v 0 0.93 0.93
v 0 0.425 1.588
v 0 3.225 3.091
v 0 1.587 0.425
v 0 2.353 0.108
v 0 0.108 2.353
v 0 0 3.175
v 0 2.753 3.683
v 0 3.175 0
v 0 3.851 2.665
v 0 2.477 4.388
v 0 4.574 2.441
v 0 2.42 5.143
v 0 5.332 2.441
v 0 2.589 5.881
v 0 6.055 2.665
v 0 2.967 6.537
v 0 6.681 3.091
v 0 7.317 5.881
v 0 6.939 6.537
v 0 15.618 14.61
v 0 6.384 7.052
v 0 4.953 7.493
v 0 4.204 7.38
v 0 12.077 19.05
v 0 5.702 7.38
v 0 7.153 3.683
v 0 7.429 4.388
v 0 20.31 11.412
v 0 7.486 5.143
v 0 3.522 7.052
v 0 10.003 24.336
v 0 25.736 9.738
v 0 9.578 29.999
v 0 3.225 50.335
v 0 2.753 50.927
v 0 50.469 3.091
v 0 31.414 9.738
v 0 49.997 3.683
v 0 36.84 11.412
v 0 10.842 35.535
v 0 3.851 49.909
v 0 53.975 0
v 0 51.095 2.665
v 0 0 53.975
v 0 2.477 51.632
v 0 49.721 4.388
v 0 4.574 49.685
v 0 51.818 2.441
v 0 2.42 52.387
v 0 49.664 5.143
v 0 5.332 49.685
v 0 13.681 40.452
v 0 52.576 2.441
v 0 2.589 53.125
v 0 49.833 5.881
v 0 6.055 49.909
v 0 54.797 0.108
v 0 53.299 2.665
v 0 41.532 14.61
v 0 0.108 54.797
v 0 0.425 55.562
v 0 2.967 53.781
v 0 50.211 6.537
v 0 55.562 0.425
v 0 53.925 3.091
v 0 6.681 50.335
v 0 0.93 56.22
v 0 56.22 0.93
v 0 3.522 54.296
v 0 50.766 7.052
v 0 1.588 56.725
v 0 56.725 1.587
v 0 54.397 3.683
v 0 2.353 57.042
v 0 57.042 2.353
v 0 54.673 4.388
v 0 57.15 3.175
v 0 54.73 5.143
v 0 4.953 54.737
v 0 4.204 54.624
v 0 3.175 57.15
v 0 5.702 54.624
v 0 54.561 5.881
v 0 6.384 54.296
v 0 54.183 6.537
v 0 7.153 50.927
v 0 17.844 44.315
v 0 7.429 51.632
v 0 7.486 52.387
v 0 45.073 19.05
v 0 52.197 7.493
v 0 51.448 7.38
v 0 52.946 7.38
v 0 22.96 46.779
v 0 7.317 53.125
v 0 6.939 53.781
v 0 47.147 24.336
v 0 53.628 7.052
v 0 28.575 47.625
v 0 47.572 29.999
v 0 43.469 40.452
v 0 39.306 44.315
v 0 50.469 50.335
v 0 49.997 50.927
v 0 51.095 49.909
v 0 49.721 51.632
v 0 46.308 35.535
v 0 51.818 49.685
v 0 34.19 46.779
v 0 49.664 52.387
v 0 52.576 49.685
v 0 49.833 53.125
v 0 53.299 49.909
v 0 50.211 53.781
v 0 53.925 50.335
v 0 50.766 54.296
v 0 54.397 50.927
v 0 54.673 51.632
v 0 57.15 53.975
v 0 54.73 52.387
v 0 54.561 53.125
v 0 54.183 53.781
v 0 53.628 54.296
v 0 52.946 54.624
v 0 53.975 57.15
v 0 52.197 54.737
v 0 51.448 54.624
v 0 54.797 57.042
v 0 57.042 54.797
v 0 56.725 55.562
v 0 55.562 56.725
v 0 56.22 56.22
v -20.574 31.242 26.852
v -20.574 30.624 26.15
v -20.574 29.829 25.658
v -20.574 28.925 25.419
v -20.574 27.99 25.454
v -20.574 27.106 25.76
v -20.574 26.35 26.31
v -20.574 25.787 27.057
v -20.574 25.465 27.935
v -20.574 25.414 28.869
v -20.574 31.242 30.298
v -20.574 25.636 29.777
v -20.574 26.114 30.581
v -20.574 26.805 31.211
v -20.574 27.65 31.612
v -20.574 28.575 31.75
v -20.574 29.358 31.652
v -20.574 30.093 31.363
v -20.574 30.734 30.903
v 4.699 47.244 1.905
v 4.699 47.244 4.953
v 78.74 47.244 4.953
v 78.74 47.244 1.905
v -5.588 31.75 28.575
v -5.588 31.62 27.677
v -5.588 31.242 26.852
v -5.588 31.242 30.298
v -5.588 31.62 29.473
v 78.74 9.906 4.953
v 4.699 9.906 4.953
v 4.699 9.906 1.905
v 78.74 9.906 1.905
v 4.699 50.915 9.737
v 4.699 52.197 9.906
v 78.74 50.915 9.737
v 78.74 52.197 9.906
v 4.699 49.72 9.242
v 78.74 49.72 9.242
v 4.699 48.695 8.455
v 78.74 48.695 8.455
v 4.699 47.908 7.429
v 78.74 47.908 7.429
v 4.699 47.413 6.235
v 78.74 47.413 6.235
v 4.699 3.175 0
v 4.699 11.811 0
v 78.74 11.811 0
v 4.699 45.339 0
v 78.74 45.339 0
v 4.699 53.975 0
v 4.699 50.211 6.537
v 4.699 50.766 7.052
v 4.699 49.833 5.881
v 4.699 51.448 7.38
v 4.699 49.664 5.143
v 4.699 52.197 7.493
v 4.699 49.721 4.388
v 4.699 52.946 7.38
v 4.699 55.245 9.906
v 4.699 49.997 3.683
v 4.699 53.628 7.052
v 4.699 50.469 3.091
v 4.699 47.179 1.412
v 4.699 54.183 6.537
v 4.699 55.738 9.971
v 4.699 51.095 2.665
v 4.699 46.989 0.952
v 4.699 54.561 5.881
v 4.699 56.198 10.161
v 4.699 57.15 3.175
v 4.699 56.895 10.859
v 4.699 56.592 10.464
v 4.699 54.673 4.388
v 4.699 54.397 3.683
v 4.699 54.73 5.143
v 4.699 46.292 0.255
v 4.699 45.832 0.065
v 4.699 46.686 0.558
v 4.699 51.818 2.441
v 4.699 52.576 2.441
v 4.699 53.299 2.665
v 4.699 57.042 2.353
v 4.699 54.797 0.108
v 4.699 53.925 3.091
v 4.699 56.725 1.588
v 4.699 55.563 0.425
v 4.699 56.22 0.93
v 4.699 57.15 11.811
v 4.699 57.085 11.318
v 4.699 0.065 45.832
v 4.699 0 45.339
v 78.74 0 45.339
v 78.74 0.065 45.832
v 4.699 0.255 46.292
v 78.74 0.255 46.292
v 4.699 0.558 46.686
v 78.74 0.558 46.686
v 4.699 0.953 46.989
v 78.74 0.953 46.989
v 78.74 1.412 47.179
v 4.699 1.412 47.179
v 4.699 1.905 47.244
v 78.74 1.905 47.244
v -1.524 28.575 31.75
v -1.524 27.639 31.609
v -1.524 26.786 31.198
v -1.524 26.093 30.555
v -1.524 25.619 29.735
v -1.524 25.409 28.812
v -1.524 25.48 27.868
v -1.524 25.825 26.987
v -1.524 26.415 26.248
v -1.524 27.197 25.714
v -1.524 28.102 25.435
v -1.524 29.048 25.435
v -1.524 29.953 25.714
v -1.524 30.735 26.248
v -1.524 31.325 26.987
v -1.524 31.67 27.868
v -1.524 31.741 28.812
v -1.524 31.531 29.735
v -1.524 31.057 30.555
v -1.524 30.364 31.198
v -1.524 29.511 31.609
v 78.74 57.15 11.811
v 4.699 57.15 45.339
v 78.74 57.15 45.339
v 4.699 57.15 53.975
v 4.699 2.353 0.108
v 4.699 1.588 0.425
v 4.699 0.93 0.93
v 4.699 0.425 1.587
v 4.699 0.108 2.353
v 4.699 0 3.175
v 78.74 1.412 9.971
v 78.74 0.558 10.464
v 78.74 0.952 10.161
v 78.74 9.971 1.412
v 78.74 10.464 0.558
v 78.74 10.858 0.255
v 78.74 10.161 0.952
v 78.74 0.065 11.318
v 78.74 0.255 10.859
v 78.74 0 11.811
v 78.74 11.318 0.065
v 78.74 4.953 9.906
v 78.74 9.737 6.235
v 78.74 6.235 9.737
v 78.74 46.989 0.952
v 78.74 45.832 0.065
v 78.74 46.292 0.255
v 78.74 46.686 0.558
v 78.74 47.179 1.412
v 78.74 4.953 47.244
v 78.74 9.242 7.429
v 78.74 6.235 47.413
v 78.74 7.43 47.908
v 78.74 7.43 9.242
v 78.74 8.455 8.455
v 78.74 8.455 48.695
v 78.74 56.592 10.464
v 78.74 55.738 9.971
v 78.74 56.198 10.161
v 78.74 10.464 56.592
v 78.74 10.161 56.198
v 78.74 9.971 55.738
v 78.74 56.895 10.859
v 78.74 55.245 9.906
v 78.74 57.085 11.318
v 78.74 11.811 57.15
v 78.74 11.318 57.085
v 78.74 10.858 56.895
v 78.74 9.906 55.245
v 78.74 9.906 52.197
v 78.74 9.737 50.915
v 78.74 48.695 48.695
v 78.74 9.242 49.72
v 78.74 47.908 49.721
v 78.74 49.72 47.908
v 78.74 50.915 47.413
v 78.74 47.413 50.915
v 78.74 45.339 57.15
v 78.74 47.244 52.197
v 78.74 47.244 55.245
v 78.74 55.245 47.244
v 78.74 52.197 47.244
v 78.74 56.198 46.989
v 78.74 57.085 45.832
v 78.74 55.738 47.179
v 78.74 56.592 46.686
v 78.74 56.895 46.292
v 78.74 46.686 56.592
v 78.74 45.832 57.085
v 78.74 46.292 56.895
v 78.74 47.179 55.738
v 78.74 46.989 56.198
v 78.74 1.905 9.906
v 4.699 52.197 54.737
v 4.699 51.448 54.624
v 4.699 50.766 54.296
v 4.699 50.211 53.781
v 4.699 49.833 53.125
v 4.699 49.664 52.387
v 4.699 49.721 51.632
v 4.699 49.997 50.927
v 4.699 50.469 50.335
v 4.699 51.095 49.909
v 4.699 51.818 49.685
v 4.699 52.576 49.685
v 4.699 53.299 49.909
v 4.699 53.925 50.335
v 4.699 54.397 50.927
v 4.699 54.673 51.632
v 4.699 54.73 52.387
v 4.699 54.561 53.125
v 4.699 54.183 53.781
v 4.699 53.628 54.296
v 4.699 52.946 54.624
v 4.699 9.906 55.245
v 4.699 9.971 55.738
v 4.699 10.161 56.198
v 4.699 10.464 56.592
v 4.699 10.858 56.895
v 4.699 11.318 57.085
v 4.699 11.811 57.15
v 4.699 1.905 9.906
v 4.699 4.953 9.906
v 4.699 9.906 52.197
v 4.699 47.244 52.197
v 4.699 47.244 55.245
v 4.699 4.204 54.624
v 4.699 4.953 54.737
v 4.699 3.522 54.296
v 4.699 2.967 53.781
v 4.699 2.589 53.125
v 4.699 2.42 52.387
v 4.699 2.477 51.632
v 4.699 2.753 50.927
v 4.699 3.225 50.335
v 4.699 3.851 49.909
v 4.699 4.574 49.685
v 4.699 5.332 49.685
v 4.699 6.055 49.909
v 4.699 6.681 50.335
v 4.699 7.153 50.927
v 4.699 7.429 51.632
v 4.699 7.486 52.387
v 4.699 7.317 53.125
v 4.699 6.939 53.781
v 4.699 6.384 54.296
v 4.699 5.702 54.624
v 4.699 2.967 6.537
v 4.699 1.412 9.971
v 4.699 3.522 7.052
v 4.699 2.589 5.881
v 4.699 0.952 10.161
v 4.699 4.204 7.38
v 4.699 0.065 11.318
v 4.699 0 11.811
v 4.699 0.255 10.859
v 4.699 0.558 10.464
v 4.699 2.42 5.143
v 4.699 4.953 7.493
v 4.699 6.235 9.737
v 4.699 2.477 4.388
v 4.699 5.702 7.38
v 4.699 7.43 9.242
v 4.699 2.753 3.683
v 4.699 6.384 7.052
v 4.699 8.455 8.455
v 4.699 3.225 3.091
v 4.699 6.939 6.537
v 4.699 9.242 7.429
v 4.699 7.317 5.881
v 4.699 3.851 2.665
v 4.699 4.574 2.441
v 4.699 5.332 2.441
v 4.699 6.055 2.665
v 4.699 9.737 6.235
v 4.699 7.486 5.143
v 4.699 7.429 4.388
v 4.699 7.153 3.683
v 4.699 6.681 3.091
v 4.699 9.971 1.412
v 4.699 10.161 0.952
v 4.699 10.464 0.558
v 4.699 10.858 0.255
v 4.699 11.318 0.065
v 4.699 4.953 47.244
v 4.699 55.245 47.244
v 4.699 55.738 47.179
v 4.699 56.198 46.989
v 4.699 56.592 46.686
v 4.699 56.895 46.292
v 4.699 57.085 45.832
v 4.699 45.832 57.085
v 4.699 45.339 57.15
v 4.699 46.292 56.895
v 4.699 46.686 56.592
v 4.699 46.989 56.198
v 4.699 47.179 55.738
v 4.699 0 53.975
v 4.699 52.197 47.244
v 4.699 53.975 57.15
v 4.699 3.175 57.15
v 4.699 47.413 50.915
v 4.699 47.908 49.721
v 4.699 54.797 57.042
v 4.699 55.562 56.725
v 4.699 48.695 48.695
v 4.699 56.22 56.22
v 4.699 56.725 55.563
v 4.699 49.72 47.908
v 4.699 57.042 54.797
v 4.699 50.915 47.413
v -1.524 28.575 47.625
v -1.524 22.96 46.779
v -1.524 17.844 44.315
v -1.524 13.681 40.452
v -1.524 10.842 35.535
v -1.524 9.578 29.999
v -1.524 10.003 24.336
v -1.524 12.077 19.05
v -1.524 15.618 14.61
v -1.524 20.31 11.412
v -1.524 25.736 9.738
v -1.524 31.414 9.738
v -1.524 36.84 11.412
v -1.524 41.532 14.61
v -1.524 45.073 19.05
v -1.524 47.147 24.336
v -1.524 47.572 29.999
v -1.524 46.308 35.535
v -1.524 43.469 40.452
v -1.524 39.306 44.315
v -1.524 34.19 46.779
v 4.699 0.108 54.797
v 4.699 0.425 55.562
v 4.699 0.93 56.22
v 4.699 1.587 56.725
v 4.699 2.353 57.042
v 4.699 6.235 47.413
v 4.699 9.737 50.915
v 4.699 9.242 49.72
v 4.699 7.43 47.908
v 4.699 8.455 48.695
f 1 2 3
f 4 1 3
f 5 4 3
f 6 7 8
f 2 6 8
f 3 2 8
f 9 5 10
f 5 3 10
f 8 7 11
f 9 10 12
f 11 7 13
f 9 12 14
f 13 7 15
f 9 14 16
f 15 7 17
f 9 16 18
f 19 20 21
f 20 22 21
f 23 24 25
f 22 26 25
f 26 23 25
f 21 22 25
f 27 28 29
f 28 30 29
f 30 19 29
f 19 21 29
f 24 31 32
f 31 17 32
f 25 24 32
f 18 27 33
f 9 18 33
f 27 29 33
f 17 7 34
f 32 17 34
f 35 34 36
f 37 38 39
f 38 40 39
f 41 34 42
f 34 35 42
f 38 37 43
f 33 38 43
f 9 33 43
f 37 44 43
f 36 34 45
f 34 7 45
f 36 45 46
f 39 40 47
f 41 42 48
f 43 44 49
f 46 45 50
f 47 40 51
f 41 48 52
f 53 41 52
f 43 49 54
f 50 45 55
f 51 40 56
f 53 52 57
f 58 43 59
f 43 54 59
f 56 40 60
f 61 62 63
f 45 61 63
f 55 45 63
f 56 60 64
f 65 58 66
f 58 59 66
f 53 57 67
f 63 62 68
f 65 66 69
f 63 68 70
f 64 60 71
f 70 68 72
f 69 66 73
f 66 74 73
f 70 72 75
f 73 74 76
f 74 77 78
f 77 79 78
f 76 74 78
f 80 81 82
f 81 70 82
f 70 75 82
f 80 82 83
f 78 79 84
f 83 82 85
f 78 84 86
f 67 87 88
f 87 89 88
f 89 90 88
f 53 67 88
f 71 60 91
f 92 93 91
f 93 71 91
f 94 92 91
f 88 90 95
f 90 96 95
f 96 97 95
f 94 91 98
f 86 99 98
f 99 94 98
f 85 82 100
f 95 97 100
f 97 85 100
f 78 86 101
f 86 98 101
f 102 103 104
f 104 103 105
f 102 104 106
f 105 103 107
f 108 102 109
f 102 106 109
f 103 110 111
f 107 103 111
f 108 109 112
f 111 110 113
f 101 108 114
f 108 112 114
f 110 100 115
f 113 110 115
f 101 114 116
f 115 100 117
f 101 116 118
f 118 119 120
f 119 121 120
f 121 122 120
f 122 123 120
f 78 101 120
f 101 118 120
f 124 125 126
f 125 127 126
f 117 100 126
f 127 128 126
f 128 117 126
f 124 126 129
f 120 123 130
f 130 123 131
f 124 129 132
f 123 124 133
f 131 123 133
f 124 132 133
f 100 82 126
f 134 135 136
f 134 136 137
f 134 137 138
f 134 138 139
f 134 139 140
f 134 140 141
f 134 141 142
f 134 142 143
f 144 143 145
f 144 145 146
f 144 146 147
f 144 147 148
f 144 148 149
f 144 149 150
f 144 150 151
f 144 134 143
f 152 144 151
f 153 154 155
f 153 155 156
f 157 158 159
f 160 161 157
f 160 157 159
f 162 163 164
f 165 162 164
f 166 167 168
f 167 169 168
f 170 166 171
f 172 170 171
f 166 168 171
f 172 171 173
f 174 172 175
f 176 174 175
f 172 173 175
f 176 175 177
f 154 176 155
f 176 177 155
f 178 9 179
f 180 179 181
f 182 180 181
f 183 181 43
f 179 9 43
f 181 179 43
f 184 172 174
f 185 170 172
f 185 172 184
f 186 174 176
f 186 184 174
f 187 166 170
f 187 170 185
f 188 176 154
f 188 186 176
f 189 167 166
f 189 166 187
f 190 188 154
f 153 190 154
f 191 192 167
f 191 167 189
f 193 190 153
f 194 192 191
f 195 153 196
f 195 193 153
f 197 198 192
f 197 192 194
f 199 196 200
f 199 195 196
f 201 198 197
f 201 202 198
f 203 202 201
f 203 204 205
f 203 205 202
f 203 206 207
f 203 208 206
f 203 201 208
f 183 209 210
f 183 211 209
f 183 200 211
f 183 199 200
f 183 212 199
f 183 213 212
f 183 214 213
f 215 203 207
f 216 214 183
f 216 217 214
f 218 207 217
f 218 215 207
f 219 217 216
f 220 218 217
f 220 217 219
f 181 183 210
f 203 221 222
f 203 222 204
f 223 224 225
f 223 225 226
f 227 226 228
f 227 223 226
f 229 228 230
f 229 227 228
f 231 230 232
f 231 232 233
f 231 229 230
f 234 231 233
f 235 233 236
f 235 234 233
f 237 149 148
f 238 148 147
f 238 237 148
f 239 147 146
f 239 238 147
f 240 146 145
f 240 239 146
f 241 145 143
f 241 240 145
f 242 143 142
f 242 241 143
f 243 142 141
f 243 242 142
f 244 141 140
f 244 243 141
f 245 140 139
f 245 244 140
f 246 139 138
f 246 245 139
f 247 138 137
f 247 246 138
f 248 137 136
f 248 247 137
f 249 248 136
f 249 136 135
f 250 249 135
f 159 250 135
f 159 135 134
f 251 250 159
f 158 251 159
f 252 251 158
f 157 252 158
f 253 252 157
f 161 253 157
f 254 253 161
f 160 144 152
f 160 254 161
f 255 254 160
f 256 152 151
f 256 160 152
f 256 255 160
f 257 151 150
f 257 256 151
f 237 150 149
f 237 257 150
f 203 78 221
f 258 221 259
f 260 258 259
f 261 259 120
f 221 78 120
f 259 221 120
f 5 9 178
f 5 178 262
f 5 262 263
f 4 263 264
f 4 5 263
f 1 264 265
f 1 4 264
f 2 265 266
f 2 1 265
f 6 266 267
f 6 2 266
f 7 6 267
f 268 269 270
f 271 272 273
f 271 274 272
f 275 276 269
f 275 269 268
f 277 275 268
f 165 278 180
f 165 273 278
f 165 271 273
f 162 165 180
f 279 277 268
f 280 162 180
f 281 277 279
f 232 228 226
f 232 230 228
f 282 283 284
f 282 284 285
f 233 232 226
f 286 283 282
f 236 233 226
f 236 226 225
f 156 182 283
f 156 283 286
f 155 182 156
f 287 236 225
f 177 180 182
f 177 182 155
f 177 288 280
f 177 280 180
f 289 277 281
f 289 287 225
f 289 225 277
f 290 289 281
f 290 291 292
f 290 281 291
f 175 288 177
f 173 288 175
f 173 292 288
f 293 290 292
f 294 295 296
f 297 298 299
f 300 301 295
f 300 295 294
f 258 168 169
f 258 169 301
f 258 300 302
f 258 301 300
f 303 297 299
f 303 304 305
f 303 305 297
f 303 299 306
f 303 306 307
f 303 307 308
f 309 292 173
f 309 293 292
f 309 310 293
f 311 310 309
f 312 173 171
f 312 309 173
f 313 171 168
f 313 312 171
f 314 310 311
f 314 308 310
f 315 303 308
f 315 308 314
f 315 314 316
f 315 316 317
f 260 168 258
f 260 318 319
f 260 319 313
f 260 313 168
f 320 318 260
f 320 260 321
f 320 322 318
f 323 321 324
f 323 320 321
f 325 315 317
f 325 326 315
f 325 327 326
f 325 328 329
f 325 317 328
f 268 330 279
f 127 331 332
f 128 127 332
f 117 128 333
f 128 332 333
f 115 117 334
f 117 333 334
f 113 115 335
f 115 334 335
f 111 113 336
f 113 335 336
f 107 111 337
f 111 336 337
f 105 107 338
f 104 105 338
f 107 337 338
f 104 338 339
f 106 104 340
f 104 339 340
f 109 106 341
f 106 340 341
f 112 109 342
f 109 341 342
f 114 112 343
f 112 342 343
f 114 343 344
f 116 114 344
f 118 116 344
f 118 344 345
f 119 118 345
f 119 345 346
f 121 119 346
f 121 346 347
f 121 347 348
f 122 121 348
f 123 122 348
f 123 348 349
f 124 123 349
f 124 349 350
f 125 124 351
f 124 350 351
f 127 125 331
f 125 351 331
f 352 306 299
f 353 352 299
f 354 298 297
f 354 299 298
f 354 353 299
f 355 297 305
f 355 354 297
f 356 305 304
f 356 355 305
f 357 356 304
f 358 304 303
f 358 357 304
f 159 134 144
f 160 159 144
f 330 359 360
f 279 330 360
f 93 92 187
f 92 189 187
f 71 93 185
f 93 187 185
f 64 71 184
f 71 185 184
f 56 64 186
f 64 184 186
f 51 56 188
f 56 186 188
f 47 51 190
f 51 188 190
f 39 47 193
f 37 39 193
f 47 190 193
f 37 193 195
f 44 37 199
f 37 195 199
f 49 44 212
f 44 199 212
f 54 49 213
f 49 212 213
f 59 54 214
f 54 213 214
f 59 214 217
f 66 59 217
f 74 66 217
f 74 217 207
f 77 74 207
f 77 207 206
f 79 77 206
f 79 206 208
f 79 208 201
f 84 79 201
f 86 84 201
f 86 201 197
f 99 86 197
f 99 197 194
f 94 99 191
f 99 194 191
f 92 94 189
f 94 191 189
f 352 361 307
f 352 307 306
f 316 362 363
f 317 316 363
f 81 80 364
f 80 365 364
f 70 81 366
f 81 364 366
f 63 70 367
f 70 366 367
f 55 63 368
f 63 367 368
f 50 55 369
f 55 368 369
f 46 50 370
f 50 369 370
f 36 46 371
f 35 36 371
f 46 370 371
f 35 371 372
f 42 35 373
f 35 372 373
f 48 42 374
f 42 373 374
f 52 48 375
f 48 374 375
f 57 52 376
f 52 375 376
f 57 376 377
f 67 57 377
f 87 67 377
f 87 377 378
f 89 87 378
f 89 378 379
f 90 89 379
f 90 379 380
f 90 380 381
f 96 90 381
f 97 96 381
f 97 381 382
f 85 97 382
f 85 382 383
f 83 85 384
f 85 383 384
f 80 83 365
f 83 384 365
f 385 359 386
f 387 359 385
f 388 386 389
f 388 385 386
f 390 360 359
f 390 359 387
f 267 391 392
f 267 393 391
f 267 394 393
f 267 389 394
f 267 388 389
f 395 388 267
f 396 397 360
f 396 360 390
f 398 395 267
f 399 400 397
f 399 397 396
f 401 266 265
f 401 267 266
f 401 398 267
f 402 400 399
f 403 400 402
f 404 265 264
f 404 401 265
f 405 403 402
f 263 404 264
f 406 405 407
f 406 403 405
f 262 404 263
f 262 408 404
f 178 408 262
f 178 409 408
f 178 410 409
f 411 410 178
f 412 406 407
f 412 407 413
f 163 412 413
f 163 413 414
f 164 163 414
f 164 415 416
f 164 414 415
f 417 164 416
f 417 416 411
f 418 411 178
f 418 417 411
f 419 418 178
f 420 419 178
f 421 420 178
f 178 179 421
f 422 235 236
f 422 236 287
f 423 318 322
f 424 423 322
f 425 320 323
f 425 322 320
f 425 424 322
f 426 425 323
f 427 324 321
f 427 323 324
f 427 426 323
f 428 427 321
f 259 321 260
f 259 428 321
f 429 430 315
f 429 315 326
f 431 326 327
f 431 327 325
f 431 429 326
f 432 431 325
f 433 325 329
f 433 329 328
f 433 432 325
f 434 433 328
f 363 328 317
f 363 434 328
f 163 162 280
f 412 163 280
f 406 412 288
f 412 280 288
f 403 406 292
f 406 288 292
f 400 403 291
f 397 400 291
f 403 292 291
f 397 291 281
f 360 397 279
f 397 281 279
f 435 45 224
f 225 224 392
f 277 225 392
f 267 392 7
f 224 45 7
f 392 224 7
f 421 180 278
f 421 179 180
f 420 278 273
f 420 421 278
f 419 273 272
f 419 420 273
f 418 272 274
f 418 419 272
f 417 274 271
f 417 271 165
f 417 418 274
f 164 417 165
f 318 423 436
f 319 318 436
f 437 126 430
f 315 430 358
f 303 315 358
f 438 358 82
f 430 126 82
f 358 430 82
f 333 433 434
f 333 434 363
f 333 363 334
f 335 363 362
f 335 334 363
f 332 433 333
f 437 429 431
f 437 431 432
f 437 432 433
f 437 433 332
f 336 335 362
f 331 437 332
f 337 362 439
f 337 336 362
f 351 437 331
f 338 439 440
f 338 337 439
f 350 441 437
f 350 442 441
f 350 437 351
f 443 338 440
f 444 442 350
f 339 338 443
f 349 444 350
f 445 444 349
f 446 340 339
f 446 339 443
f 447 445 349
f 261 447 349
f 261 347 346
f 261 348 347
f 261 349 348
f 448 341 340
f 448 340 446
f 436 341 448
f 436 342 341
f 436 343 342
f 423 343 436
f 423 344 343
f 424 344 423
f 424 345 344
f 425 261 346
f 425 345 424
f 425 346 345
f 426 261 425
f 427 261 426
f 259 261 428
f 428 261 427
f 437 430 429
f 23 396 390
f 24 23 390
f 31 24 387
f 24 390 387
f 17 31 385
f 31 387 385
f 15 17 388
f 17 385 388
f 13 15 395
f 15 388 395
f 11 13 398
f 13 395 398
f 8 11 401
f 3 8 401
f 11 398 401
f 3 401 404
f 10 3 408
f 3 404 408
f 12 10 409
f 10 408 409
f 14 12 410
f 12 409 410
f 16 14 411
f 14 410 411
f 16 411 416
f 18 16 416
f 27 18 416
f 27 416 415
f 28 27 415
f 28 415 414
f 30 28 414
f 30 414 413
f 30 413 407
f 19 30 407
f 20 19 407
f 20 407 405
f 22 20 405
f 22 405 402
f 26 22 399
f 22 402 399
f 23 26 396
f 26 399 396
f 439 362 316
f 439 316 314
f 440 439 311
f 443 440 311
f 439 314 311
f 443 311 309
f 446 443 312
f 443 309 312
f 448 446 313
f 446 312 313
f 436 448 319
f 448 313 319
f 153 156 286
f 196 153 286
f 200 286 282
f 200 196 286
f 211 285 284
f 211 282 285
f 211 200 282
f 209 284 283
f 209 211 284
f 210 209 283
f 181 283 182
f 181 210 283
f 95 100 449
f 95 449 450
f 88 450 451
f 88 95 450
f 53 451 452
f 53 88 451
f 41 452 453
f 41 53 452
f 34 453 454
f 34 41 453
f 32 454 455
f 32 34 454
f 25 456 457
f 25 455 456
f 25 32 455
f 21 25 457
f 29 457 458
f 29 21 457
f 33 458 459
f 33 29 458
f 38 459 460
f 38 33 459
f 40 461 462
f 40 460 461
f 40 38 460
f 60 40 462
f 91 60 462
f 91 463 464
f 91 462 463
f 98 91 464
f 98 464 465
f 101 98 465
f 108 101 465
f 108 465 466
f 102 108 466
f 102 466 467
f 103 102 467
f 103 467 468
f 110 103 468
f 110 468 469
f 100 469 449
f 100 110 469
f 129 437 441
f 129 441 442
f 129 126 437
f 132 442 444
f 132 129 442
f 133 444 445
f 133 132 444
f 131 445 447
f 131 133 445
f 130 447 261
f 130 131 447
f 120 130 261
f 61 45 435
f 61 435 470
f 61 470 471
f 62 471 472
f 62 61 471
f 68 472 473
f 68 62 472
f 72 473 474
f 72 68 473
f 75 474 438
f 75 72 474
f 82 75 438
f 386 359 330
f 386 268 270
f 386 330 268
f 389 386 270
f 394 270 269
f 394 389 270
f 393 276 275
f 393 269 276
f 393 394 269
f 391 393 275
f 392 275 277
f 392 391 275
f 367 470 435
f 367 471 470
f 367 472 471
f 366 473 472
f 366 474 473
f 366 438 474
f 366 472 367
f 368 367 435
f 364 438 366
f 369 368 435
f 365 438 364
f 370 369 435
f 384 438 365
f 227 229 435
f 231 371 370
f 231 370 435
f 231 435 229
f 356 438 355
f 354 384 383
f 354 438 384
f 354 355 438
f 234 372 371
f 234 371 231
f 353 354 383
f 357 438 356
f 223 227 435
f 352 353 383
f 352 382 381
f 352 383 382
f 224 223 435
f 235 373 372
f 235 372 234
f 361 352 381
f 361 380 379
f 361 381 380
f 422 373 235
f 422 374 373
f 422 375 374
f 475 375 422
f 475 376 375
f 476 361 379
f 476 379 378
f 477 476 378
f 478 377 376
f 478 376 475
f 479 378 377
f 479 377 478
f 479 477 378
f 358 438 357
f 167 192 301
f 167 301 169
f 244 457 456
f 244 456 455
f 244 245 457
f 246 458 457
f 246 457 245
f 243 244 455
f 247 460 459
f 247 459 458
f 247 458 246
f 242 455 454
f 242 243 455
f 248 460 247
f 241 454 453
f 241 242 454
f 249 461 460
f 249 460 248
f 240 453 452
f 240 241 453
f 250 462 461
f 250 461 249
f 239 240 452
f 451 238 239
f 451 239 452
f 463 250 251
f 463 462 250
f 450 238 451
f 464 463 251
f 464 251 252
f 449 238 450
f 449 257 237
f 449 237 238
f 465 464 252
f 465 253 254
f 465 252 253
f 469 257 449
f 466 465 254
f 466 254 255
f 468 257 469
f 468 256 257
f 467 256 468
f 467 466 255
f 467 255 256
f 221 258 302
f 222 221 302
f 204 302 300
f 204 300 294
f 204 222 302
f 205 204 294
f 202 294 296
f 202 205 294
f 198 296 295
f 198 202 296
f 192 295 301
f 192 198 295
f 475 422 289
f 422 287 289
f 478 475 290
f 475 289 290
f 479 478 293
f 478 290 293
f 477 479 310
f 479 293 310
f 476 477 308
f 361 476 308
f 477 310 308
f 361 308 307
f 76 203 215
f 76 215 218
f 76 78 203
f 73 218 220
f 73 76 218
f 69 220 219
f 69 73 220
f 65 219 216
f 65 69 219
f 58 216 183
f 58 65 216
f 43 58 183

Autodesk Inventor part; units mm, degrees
ref_plane "YZ Plane" through (0, 0, 0) normal (1, 0, 0) x (0, 1, 0)
ref_plane "XZ Plane" through (0, 0, 0) normal (0, 1, 0) x (-1, 0, 0)
ref_plane "XY Plane" through (0, 0, 0) normal (0, 0, 1) x (1, 0, 0)
sketch "Sketch1" plane through (0, 0, 0) normal (1, 0, 0) x (0, 1, 0)
  line L0 (3.175, 0) -> (53.975, 0)
  line L1 (57.15, 3.175) -> (57.15, 53.975)
  line L2 (53.975, 57.15) -> (3.175, 57.15)
  line L3 (0, 53.975) -> (0, 3.175)
  arc A0 (3.175, 57.15) -> (0, 53.975) centre (3.175, 53.975) ccw
  arc A1 (57.15, 53.975) -> (53.975, 57.15) centre (53.975, 53.975) ccw
  arc A2 (53.975, 0) -> (57.15, 3.175) centre (53.975, 3.175) ccw
  arc A3 (0, 3.175) -> (3.175, 0) centre (3.175, 3.175) ccw
  point P0 (0, 0)
  point P1 (57.15, 57.15)
  point P2 (57.15, 0)
  point P3 (0, 57.15)
  dimension "d0" = 57.15
  dimension "d1" = 57.15
  dimension "d17" = 3.175
extrude "Extrusion1" add sketch "Sketch1" along normal blind 78.74
sketch "Sketch2" plane through (0, 0, 0) normal (-1, 0, 0) x (0, 0, 1)
  line L0 (0, 53.975) -> (0, 3.175) projected
  line L1 (53.975, 57.15) -> (3.175, 57.15) projected
  circle A0 centre (28.575, 28.575) radius 19.05
  point P0 (0, 57.15)
  point P1 (0, 0)
  point P2 (57.15, 57.15)
  dimension "d4" = 38.1
  dimension "d18" = 28.575
  dimension "d19" = 28.575
extrude "Extrusion2" add sketch "Sketch2" along normal blind 1.524
sketch "Sketch3" plane through (-1.524, 28.575, 28.575) normal (-1, 0, 0) x (0, 0, 1)
  circle A0 centre (0, 0) radius 19.05 projected
  circle A1 centre (0, 0) radius 3.175
  point P0 (-28.575, -28.575)
  dimension "d10" = 6.35
extrude "Extrusion3" add sketch "Sketch3" along normal blind 19.05 contours A1
sketch "Sketch4" plane through (-20.574, 28.575, 28.575) normal (-1, 0, 0) x (0, 0, 1)
  circle A0 centre (0, 0) radius 3.175 projected
  line L0 (-1.7227, 2.667) -> (1.7227, 2.667)
  line L1 (0, -3.175) -> (-5.2914, -3.175)
  point P0 (-28.575, -28.575)
  dimension "d13" = 5.842
extrude "Extrusion4" cut sketch "Sketch4" against normal blind 14.986 contours L0 A0 picked at (-0.1211, 2.8294)
sketch "Sketch5" plane through (78.74, 0, 0) normal (1, 0, 0) x (0, 0, -1)
  line L0 (-57.15, 53.975) -> (-57.15, 3.175) projected
  arc A0 (-57.15, 3.175) -> (-53.975, 0) centre (-53.975, 3.175) ccw projected
  line L1 (-53.975, 0) -> (-3.175, 0) projected
  arc A1 (-3.175, 0) -> (0, 3.175) centre (-3.175, 3.175) ccw projected
  line L2 (0, 3.175) -> (0, 53.975) projected
  arc A2 (0, 53.975) -> (-3.175, 57.15) centre (-3.175, 53.975) ccw projected
  line L3 (-3.175, 57.15) -> (-53.975, 57.15) projected
  arc A3 (-53.975, 57.15) -> (-57.15, 53.975) centre (-53.975, 53.975) ccw projected
  circle A4 centre (-52.197, 52.197) radius 2.54
  circle A5 centre (-52.197, 52.197) radius 4.953
  line L4 (-3.175, 57.15) -> (-53.975, 57.15) projected
  line L5 (-52.197, 47.244) -> (-57.15, 47.244)
  line L6 (-57.15, 47.244) -> (-57.15, 57.15)
  line L7 (-57.15, 57.15) -> (-47.244, 57.15)
  line L8 (-47.244, 57.15) -> (-47.244, 52.197)
  circle A6 centre (-4.953, 52.197) radius 4.953
  circle A7 centre (-4.953, 4.953) radius 4.953
  circle A8 centre (-52.197, 4.953) radius 4.953
  line L9 (0, 3.175) -> (0, 53.975) projected
  line L10 (-53.975, 0) -> (-3.175, 0) projected
  line L11 (-57.15, 53.975) -> (-57.15, 3.175) projected
  line L12 (0, 57.15) -> (-9.906, 57.15)
  line L13 (-9.906, 57.15) -> (-9.906, 52.197)
  line L14 (-4.953, 47.244) -> (0, 47.244)
  line L15 (0, 47.244) -> (0, 57.15)
  line L16 (-57.15, 0) -> (-47.244, 0)
  line L17 (-47.244, 0) -> (-47.244, 4.953)
  line L18 (-52.197, 9.906) -> (-57.15, 9.906)
  line L19 (-57.15, 9.906) -> (-57.15, 0)
  line L20 (-4.953, 9.906) -> (0, 9.906)
  line L21 (0, 9.906) -> (0, 0)
  line L22 (0, 0) -> (-9.906, 0)
  line L23 (-9.906, 0) -> (-9.906, 4.953)
  dimension "d48" = 4.953
  dimension "d49" = 4.953
  dimension "d50" = 5.08
  dimension "d51" = 9.906
  dimension "d52" = 9.906
  dimension "d53" = 9.906
  dimension "d54" = 9.906
  dimension "d55" = 9.906
  dimension "d56" = 9.906
  dimension "d57" = 9.906
  dimension "d58" = 9.906
  dimension "d59" = 9.906
  dimension "d60" = 9.906
  dimension "d61" = 9.906
  dimension "d62" = 9.906
  dimension "d63" = 9.906
extrude "Extrusion6" cut sketch "Sketch5" against normal blind 74.041 contours L0 A5 L5 | L18 A8 L0 | L0 A3 L3 A5 | A5 | A8 L1 A0 L0 | A8 | L6 L7 A3 | L3 L8 A5 | A0 L16 L19 | A8 L17 L1 | L3 A6 L13 | L23 A7 L1 | L3 A2 L2 A6 | A6 | A7 L2 A1 L1 | A7 | L12 L15 A2 | L2 L14 A6 | A1 L21 L22 | A7 L20 L2 | A4
fillet "Fillet1" radius 1.905 8 edges at (41.7195, 57.15, 47.244) (41.7195, 47.244, 57.15) (41.7195, 57.15, 9.906) (41.7195, 47.244, 0) (41.7195, 9.906, 0) (41.7195, 0, 9.906) (41.7195, 0, 47.244) (41.7195, 9.906, 57.15)
sketch "Sketch6" plane through (0, 0, 0) normal (-1, 0, 0) x (0, 0, 1)
  line L0 (53.975, 57.15) -> (3.175, 57.15) projected
  line L1 (0, 53.975) -> (0, 3.175) projected
  point P0 (0, 0)
  point P1 (4.953, 52.197)
  point P2 (52.197, 52.197)
  point P3 (52.197, 4.953)
  point P4 (4.953, 4.953)
  dimension "d36" = 47.244
  dimension "d37" = 47.244
  dimension "d39" = 4.953
  dimension "d40" = 4.953
hole "Hole1" at (0, 52.197, 4.953) at (0, 52.197, 52.197) at (0, 4.953, 52.197) at (0, 4.953, 4.953) direction (1, 0, 0) diameter 5.08 end through all
properties part number "G723-280-4"
